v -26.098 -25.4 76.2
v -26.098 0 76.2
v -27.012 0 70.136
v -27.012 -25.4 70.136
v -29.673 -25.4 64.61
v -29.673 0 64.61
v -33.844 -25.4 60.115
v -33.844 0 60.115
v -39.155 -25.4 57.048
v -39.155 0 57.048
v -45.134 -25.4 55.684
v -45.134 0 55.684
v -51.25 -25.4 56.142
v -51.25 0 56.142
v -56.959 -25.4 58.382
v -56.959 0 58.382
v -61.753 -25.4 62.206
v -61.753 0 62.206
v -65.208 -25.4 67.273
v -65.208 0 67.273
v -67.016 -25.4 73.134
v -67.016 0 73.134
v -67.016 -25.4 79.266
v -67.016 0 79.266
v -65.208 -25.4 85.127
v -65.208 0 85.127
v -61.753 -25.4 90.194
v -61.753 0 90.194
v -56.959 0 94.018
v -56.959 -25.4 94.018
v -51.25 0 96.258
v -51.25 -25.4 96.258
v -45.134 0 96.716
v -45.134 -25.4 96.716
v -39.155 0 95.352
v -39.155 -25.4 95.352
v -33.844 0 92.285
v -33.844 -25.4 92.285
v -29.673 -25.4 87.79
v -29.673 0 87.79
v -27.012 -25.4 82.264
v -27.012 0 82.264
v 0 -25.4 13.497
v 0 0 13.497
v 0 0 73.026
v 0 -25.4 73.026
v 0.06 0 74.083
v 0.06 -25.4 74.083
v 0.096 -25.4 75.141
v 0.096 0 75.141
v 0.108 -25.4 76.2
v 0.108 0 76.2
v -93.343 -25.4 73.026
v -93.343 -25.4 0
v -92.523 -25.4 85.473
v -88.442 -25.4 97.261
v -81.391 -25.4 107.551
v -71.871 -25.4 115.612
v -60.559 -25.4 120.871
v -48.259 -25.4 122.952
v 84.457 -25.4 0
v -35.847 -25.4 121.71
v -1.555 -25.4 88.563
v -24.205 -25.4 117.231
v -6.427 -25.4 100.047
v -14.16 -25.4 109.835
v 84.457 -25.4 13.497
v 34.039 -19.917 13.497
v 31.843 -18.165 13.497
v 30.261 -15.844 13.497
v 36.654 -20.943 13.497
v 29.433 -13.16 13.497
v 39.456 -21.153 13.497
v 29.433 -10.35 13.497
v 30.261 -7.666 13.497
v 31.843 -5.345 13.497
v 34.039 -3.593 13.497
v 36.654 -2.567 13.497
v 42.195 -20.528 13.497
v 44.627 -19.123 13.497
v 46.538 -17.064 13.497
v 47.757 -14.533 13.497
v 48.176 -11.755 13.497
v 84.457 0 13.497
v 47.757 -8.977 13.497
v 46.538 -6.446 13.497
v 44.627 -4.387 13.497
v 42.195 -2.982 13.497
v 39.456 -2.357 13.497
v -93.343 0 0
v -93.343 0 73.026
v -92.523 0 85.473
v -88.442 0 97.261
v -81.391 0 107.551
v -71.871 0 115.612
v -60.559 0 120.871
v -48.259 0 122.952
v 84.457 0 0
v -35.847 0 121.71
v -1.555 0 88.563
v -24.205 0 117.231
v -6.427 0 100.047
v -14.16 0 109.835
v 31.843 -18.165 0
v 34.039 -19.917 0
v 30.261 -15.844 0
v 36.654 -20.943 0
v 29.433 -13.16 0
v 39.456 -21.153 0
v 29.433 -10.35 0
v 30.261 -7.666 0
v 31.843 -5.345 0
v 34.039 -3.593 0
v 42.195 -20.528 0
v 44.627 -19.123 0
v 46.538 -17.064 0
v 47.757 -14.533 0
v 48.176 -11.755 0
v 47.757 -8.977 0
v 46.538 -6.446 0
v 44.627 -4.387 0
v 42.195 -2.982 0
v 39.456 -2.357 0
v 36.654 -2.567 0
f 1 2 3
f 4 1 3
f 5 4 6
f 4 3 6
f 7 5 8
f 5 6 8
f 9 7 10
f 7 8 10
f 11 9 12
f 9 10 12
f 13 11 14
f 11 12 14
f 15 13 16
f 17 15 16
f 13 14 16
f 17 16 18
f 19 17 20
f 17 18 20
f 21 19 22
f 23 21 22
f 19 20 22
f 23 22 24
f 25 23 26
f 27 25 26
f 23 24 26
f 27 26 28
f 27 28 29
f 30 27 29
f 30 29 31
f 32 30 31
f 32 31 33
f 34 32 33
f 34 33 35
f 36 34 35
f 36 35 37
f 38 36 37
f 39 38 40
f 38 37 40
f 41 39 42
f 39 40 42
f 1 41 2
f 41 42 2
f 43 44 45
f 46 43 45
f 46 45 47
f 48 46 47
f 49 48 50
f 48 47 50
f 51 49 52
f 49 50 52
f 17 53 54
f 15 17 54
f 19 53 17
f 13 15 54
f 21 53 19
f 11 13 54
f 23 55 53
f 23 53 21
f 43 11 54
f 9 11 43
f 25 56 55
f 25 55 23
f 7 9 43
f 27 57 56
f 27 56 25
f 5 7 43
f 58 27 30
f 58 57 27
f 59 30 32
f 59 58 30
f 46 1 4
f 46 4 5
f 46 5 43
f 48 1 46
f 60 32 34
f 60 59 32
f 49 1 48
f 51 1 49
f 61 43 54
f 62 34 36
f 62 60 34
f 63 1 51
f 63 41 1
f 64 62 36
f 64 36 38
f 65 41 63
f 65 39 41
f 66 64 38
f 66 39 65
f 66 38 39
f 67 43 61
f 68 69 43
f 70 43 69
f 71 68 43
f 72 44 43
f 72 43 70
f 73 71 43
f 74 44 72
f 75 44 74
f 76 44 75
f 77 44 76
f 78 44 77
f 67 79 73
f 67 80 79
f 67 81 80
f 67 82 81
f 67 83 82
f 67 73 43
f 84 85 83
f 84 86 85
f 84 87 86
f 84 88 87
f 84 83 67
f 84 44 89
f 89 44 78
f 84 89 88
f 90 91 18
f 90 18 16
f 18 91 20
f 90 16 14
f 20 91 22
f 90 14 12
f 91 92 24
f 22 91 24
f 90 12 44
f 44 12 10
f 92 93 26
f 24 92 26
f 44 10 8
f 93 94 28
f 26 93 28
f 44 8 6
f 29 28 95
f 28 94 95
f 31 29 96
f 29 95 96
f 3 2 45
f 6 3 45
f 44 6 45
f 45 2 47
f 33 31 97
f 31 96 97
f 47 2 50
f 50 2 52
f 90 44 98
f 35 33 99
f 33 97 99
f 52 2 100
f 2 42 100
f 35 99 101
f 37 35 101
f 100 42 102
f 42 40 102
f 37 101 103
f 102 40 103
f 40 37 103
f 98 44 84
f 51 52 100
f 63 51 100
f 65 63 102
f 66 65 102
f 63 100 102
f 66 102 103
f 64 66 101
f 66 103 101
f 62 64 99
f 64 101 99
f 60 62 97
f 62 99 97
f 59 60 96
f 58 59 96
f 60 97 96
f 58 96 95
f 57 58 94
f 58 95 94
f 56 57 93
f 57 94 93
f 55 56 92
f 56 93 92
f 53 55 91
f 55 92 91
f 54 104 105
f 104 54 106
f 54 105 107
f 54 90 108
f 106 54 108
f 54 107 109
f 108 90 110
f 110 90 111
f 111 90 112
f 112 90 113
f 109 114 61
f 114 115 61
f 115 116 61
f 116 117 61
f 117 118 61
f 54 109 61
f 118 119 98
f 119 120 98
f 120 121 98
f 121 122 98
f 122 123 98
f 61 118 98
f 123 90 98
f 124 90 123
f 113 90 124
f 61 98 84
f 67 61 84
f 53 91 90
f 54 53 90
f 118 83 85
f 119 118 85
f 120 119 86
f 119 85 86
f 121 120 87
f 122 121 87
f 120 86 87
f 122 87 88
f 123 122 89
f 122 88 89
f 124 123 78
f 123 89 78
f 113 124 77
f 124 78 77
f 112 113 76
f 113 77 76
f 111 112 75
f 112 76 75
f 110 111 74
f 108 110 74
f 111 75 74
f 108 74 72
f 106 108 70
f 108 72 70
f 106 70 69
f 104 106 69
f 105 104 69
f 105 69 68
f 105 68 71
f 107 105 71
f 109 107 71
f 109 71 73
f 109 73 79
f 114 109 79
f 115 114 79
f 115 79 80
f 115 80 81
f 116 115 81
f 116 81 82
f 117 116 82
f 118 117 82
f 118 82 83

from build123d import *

# Parameters (mm, degrees)
F0_W     = 84.456712
F0_H     = 13.497178
F1_DEPTH = 25.4
F2_R     = 9.965613
F3_DEPTH = 25.4
F4_R     = 9.424237
F5_DEPTH = 25.4


with BuildPart() as f1:
    # F0 (on Front) → F1 (new body)
    with BuildSketch(Plane.XZ):
        with BuildLine():
            ThreePointArc((0.107788, 76.2), (-48.259449, 122.952477), (-93.343288, 73.026219))
            Line((-93.343288, 73.026219), (-93.343288, 76.2))
            Line((-93.343288, 76.2), (-67.245644, 76.2))
            ThreePointArc((-67.245644, 76.2), (-46.671644, 96.774), (-26.097644, 76.2))
            Line((-26.097644, 76.2), (0, 76.2))
            Line((0, 76.2), (0, 73.026219))
            ThreePointArc((0, 73.026219), (0.080833, 74.612195), (0.107788, 76.2))
        make_face()
        with BuildLine():
            Line((-93.343288, 76.2), (-93.343288, 73.026219))
            ThreePointArc((-93.343288, 73.026219), (-46.671644, 29.420568), (0, 73.026219))
            Line((0, 73.026219), (0, 76.2))
            Line((0, 76.2), (-26.097644, 76.2))
            ThreePointArc((-26.097644, 76.2), (-46.671644, 55.626), (-67.245644, 76.2))
            Line((-67.245644, 76.2), (-93.343288, 76.2))
        make_face()
        with BuildLine():
            Line((-93.343288, 73.026219), (-93.343288, 0))
            Line((-93.343288, 0), (0, 0))
            Line((0, 0), (0, 13.497178))
            Line((0, 13.497178), (0, 73.026219))
            ThreePointArc((0, 73.026219), (-46.671644, 29.420568), (-93.343288, 73.026219))
        make_face()
        with Locations((42.228356, 6.748589)):
            Rectangle(F0_W, F0_H)
    extrude(amount=F1_DEPTH)

    # F2 (on Top) → F3 (cut)
    with BuildSketch(Plane.XY):
        with Locations((45.747578, -12.0396)):
            Circle(F2_R)
    extrude(amount=-F3_DEPTH, mode=Mode.SUBTRACT)

    # F4 (on face) → F5 (cut)
    with BuildSketch(Plane.XY.offset(13.497178)):
        with Locations((38.751498, -11.754938)):
            Circle(F4_R)
    extrude(amount=-F5_DEPTH, mode=Mode.SUBTRACT)


solid = f1.part
